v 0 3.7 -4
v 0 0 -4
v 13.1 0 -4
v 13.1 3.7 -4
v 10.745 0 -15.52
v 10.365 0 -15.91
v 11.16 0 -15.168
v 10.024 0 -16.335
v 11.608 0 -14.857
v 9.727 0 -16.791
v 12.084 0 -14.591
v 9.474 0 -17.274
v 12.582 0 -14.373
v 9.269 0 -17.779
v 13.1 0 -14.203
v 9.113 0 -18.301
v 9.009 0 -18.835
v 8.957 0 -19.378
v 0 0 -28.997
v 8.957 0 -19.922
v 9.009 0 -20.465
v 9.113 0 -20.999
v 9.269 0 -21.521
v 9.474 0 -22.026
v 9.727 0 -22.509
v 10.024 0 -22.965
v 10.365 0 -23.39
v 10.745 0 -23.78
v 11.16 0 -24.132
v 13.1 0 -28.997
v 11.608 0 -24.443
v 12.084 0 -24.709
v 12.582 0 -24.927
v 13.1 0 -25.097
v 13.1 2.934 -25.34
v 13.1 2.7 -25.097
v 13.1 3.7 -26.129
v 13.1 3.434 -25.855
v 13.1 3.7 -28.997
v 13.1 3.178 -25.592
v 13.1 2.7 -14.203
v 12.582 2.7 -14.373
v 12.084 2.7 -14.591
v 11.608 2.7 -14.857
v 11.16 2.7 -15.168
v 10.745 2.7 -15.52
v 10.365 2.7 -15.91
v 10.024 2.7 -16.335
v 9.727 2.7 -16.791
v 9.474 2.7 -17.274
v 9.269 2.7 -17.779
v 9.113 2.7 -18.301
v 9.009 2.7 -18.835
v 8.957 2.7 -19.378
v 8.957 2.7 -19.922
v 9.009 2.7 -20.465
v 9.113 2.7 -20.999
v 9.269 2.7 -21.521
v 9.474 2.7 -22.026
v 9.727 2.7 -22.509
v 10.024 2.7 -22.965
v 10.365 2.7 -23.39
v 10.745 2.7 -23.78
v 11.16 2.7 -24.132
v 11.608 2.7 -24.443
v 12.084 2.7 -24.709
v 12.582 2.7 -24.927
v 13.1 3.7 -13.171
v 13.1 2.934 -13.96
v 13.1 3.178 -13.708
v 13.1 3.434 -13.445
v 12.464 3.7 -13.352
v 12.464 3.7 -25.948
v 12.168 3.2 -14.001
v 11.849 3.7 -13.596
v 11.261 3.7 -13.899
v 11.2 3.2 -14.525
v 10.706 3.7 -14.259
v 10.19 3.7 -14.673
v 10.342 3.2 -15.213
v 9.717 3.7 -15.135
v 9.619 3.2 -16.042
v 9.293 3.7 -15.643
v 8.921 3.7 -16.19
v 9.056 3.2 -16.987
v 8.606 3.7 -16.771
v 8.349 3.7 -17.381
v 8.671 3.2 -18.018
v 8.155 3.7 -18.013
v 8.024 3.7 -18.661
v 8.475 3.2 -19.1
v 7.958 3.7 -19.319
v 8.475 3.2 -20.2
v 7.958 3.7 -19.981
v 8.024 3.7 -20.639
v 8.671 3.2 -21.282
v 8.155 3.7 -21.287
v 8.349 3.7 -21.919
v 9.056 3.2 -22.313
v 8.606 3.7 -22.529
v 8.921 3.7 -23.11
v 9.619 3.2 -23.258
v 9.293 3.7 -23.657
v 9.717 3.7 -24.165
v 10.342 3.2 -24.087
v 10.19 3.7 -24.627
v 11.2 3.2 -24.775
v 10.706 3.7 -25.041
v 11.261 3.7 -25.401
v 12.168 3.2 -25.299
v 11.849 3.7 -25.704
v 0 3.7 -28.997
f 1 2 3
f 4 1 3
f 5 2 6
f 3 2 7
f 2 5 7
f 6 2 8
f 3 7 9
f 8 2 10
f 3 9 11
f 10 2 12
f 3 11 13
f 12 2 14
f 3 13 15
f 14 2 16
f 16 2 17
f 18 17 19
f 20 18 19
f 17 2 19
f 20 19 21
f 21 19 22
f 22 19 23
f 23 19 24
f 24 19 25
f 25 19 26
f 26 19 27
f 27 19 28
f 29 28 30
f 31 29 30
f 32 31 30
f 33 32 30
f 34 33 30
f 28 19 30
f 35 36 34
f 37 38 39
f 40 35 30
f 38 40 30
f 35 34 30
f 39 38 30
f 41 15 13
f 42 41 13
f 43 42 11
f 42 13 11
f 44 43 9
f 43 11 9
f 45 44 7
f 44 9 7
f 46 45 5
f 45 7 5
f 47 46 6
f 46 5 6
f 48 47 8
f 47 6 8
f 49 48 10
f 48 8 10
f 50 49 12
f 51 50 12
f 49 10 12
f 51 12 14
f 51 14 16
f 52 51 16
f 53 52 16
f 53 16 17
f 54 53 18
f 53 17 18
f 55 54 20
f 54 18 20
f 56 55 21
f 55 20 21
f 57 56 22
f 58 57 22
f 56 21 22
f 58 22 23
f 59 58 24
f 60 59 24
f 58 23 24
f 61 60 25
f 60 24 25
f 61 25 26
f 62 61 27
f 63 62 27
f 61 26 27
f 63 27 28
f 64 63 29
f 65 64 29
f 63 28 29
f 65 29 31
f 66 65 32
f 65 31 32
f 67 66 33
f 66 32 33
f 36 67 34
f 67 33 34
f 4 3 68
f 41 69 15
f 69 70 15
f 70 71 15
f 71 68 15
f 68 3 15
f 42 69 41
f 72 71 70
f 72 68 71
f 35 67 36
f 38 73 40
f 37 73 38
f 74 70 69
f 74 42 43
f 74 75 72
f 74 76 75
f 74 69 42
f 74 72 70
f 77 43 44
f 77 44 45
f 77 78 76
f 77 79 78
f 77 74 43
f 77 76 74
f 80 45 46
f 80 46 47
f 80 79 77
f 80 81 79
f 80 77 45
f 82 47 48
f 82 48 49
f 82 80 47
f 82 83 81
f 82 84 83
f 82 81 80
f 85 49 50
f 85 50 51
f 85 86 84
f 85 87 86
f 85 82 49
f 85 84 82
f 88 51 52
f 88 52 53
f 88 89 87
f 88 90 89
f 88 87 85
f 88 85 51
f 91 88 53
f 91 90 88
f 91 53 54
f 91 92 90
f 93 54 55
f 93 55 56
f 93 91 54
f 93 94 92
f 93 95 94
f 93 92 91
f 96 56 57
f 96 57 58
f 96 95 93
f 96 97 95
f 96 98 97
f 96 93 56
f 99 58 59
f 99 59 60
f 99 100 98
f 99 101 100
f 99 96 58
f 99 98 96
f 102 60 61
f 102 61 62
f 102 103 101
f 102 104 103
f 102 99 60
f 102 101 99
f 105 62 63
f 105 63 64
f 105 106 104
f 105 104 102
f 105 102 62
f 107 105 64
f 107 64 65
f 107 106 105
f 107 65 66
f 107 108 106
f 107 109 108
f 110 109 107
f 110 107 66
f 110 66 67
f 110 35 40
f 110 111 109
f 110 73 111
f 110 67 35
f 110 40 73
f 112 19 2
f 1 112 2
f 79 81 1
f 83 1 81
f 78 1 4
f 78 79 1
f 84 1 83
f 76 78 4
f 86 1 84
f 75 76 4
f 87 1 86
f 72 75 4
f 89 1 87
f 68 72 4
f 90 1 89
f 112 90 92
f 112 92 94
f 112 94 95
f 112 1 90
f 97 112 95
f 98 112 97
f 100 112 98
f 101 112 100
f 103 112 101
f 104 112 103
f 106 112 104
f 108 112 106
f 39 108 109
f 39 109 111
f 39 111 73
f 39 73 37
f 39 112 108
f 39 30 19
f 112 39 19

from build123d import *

# Parameters (mm, degrees)
BOSS_EXTRUDE1_DEPTH = 3.7
CHAMFER1_SIZE       = 1


with BuildPart() as part:
    # Sketch1 → Boss-Extrude1 (new body)
    with BuildSketch(Plane(origin=(0, 0, 0), x_dir=(1, 0, 0), z_dir=(0, 1, 0))):
        with BuildLine():
            Line((0, 28.997247011), (0, 4))
            Line((0, 4), (13.1, 4))
            Line((13.1, 4), (13.1, 14.202752989))
            ThreePointArc((13.1, 14.202752989), (8.95, 19.65), (13.1, 25.097247011))
            Line((13.1, 25.097247011), (13.1, 28.997247011))
            Line((13.1, 28.997247011), (0, 28.997247011))
        make_face()
    extrude(amount=BOSS_EXTRUDE1_DEPTH)

    # Chamfer1
    chamfer1_edges = [part.edges().sort_by_distance(p)[0] for p in [
        (8.95, 3.7, -19.65),
    ]]
    chamfer(chamfer1_edges, length=CHAMFER1_SIZE)


solid = part.part
